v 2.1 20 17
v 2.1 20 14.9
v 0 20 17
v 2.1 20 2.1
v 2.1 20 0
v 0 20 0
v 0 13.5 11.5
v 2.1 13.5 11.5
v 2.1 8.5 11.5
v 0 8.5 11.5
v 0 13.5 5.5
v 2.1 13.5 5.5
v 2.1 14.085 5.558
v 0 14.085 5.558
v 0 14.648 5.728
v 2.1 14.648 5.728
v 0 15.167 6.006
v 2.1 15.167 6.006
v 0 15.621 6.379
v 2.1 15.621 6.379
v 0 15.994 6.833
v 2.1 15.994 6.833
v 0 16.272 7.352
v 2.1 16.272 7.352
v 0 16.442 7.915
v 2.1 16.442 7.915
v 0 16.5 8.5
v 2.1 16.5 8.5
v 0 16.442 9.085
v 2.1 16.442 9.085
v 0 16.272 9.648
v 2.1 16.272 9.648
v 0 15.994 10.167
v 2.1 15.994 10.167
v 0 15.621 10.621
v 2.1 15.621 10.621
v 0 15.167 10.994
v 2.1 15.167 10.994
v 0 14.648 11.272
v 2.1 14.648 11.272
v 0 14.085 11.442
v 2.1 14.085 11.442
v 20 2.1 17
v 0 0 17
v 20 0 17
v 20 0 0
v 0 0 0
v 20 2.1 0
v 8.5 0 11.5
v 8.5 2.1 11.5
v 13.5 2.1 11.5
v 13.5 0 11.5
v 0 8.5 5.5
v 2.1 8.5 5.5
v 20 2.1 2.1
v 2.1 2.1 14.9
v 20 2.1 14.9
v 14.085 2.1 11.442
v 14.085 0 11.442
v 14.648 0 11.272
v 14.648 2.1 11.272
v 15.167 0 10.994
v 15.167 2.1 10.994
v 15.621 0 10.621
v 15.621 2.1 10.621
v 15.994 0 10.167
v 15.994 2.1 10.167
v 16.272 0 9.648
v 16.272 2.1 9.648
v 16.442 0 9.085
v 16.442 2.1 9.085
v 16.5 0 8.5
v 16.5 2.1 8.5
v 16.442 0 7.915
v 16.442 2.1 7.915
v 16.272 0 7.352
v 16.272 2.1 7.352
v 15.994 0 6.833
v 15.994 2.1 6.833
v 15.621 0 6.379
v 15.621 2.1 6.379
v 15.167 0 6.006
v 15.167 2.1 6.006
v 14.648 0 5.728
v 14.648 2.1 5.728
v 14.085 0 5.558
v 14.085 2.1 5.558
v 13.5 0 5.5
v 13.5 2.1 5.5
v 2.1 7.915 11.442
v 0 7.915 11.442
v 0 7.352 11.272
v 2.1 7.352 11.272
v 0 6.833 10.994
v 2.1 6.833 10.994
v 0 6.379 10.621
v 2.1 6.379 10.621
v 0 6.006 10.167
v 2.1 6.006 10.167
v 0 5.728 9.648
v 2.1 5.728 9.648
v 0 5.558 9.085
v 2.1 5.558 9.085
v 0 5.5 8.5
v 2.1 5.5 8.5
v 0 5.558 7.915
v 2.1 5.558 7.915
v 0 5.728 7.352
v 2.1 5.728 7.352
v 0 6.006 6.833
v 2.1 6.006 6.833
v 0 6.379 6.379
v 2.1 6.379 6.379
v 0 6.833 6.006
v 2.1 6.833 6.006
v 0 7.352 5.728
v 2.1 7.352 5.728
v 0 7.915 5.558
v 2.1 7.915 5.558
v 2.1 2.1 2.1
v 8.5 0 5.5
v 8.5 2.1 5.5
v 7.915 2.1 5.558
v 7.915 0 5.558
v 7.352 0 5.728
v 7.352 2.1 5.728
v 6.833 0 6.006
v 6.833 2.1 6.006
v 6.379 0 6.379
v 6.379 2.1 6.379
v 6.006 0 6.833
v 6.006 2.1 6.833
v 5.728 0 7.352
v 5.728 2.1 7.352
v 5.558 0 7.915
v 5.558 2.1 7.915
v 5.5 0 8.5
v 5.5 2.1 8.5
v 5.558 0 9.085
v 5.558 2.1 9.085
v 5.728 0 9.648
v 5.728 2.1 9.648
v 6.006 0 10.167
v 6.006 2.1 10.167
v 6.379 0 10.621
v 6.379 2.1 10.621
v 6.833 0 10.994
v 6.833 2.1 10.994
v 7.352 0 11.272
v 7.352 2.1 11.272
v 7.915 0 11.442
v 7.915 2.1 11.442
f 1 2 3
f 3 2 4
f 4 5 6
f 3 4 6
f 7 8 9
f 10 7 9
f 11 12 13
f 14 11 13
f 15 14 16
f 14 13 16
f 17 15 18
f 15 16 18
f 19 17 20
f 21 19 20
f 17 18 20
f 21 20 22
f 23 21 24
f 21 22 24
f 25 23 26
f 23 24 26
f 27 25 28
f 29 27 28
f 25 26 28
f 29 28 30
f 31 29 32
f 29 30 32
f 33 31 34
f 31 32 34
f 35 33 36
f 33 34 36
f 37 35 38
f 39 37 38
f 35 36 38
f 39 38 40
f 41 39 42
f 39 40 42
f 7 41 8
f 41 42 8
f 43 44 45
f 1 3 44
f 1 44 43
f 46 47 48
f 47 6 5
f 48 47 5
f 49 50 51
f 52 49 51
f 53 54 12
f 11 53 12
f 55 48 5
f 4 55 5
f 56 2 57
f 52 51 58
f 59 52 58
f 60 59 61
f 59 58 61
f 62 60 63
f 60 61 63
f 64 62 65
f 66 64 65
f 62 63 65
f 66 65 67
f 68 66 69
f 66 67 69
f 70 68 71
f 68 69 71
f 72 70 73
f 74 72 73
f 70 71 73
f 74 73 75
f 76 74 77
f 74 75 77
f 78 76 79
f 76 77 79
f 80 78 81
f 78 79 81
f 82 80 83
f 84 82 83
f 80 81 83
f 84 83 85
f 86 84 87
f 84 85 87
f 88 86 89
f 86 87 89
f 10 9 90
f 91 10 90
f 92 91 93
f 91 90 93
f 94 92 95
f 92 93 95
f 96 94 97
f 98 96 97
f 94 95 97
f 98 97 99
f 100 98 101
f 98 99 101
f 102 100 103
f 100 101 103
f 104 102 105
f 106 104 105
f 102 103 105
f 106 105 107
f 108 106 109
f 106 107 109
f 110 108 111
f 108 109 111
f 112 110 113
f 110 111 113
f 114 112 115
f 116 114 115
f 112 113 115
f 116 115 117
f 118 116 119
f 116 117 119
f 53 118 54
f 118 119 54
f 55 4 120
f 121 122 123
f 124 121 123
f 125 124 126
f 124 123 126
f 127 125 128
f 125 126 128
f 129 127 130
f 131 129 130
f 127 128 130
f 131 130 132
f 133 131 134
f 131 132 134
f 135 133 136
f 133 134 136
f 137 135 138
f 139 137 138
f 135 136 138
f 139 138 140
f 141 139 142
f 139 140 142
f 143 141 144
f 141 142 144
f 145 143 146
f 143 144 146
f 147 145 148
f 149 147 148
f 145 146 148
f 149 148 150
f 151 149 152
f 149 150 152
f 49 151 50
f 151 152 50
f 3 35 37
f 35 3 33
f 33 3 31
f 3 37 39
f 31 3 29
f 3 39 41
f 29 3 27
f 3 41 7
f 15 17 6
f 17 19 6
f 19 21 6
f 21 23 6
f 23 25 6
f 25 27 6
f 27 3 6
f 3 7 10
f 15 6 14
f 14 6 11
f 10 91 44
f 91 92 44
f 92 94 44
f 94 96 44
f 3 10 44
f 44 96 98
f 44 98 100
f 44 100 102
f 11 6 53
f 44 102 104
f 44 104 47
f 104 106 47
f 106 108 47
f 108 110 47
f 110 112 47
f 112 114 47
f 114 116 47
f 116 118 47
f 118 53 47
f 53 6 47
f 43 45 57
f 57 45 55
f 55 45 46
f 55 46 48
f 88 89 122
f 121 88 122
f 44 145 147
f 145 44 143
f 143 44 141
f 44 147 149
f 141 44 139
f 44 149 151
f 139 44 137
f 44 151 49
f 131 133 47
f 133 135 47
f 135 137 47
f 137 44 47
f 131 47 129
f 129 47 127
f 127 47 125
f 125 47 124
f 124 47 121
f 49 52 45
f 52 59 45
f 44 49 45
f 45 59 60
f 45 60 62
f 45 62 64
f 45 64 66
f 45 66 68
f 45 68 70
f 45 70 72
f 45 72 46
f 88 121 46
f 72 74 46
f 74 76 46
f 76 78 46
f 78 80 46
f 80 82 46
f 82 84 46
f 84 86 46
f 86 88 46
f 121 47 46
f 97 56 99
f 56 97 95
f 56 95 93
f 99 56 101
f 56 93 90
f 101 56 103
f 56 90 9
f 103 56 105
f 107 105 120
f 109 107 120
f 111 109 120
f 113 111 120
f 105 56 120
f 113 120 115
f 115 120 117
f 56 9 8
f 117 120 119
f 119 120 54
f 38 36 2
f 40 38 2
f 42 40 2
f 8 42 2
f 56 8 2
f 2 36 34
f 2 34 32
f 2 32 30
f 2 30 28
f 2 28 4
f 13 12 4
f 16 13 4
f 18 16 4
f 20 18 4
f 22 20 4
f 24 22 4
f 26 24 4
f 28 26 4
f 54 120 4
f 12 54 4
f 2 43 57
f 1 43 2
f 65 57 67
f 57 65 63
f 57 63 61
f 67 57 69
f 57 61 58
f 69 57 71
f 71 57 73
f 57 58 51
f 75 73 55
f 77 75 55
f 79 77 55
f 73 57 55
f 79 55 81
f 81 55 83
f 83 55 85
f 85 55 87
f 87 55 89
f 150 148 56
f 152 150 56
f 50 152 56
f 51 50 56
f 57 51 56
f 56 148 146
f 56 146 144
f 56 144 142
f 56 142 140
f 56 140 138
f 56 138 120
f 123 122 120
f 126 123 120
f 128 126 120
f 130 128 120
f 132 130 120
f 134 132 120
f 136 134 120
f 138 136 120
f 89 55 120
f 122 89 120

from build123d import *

# Parameters (mm, degrees)
EXTRUDE_1_DEPTH     = 17
EXTRUDE_2_DEPTH     = 2.1
EXTRUDE_3_DEPTH     = 2.1
CUT_EXTRUDE_1_DEPTH = 32.771213386
CUT_EXTRUDE_2_DEPTH = 32.771213386


with BuildPart() as part:
    # 草图1 → 凸台-拉伸1 (new body)
    with BuildSketch(Plane.XY):
        Polygon((0, 0), (20, 0), (20, 2.1), (2.1, 2.1), (2.1, 20), (0, 20), align=None)
    extrude(amount=EXTRUDE_1_DEPTH)

    # 草图2 → 凸台-拉伸2 (add)
    with BuildSketch(Plane(origin=(0, 0, 0), x_dir=(-1, 0, 0), z_dir=(0, 0, -1))):
        Polygon((-2.1, 20), (-2.1, 2.1), (-20, 2.1), align=None)
    extrude(amount=-EXTRUDE_2_DEPTH)

    # 草图3 → 凸台-拉伸3 (add)
    with BuildSketch(Plane.XY.offset(17)):
        Polygon((2.1, 20), (2.1, 2.1), (20, 2.1), align=None)
    extrude(amount=-EXTRUDE_3_DEPTH)

    # 草图4 → 切除-拉伸1 (cut, through all)
    with BuildSketch(Plane(origin=(2.1, 0, 0), x_dir=(0, 0, -1), z_dir=(1, 0, 0))):
        with BuildLine():
            Line((-11.5, 13.5), (-11.5, 8.5))
            ThreePointArc((-11.5, 8.5), (-8.5, 5.5), (-5.5, 8.5))
            Line((-5.5, 8.5), (-5.5, 13.5))
            ThreePointArc((-5.5, 13.5), (-8.5, 16.5), (-11.5, 13.5))
        make_face()
    extrude(amount=-CUT_EXTRUDE_1_DEPTH, mode=Mode.SUBTRACT)

    # 草图5 → 切除-拉伸2 (cut, through all)
    with BuildSketch(Plane(origin=(0, 2.1, 0), x_dir=(1, 0, 0), z_dir=(0, 1, 0))):
        with BuildLine():
            Line((8.5, -11.5), (13.5, -11.5))
            ThreePointArc((13.5, -11.5), (16.5, -8.5), (13.5, -5.5))
            Line((13.5, -5.5), (8.5, -5.5))
            ThreePointArc((8.5, -5.5), (5.5, -8.5), (8.5, -11.5))
        make_face()
    extrude(amount=-CUT_EXTRUDE_2_DEPTH, mode=Mode.SUBTRACT)


solid = part.part
